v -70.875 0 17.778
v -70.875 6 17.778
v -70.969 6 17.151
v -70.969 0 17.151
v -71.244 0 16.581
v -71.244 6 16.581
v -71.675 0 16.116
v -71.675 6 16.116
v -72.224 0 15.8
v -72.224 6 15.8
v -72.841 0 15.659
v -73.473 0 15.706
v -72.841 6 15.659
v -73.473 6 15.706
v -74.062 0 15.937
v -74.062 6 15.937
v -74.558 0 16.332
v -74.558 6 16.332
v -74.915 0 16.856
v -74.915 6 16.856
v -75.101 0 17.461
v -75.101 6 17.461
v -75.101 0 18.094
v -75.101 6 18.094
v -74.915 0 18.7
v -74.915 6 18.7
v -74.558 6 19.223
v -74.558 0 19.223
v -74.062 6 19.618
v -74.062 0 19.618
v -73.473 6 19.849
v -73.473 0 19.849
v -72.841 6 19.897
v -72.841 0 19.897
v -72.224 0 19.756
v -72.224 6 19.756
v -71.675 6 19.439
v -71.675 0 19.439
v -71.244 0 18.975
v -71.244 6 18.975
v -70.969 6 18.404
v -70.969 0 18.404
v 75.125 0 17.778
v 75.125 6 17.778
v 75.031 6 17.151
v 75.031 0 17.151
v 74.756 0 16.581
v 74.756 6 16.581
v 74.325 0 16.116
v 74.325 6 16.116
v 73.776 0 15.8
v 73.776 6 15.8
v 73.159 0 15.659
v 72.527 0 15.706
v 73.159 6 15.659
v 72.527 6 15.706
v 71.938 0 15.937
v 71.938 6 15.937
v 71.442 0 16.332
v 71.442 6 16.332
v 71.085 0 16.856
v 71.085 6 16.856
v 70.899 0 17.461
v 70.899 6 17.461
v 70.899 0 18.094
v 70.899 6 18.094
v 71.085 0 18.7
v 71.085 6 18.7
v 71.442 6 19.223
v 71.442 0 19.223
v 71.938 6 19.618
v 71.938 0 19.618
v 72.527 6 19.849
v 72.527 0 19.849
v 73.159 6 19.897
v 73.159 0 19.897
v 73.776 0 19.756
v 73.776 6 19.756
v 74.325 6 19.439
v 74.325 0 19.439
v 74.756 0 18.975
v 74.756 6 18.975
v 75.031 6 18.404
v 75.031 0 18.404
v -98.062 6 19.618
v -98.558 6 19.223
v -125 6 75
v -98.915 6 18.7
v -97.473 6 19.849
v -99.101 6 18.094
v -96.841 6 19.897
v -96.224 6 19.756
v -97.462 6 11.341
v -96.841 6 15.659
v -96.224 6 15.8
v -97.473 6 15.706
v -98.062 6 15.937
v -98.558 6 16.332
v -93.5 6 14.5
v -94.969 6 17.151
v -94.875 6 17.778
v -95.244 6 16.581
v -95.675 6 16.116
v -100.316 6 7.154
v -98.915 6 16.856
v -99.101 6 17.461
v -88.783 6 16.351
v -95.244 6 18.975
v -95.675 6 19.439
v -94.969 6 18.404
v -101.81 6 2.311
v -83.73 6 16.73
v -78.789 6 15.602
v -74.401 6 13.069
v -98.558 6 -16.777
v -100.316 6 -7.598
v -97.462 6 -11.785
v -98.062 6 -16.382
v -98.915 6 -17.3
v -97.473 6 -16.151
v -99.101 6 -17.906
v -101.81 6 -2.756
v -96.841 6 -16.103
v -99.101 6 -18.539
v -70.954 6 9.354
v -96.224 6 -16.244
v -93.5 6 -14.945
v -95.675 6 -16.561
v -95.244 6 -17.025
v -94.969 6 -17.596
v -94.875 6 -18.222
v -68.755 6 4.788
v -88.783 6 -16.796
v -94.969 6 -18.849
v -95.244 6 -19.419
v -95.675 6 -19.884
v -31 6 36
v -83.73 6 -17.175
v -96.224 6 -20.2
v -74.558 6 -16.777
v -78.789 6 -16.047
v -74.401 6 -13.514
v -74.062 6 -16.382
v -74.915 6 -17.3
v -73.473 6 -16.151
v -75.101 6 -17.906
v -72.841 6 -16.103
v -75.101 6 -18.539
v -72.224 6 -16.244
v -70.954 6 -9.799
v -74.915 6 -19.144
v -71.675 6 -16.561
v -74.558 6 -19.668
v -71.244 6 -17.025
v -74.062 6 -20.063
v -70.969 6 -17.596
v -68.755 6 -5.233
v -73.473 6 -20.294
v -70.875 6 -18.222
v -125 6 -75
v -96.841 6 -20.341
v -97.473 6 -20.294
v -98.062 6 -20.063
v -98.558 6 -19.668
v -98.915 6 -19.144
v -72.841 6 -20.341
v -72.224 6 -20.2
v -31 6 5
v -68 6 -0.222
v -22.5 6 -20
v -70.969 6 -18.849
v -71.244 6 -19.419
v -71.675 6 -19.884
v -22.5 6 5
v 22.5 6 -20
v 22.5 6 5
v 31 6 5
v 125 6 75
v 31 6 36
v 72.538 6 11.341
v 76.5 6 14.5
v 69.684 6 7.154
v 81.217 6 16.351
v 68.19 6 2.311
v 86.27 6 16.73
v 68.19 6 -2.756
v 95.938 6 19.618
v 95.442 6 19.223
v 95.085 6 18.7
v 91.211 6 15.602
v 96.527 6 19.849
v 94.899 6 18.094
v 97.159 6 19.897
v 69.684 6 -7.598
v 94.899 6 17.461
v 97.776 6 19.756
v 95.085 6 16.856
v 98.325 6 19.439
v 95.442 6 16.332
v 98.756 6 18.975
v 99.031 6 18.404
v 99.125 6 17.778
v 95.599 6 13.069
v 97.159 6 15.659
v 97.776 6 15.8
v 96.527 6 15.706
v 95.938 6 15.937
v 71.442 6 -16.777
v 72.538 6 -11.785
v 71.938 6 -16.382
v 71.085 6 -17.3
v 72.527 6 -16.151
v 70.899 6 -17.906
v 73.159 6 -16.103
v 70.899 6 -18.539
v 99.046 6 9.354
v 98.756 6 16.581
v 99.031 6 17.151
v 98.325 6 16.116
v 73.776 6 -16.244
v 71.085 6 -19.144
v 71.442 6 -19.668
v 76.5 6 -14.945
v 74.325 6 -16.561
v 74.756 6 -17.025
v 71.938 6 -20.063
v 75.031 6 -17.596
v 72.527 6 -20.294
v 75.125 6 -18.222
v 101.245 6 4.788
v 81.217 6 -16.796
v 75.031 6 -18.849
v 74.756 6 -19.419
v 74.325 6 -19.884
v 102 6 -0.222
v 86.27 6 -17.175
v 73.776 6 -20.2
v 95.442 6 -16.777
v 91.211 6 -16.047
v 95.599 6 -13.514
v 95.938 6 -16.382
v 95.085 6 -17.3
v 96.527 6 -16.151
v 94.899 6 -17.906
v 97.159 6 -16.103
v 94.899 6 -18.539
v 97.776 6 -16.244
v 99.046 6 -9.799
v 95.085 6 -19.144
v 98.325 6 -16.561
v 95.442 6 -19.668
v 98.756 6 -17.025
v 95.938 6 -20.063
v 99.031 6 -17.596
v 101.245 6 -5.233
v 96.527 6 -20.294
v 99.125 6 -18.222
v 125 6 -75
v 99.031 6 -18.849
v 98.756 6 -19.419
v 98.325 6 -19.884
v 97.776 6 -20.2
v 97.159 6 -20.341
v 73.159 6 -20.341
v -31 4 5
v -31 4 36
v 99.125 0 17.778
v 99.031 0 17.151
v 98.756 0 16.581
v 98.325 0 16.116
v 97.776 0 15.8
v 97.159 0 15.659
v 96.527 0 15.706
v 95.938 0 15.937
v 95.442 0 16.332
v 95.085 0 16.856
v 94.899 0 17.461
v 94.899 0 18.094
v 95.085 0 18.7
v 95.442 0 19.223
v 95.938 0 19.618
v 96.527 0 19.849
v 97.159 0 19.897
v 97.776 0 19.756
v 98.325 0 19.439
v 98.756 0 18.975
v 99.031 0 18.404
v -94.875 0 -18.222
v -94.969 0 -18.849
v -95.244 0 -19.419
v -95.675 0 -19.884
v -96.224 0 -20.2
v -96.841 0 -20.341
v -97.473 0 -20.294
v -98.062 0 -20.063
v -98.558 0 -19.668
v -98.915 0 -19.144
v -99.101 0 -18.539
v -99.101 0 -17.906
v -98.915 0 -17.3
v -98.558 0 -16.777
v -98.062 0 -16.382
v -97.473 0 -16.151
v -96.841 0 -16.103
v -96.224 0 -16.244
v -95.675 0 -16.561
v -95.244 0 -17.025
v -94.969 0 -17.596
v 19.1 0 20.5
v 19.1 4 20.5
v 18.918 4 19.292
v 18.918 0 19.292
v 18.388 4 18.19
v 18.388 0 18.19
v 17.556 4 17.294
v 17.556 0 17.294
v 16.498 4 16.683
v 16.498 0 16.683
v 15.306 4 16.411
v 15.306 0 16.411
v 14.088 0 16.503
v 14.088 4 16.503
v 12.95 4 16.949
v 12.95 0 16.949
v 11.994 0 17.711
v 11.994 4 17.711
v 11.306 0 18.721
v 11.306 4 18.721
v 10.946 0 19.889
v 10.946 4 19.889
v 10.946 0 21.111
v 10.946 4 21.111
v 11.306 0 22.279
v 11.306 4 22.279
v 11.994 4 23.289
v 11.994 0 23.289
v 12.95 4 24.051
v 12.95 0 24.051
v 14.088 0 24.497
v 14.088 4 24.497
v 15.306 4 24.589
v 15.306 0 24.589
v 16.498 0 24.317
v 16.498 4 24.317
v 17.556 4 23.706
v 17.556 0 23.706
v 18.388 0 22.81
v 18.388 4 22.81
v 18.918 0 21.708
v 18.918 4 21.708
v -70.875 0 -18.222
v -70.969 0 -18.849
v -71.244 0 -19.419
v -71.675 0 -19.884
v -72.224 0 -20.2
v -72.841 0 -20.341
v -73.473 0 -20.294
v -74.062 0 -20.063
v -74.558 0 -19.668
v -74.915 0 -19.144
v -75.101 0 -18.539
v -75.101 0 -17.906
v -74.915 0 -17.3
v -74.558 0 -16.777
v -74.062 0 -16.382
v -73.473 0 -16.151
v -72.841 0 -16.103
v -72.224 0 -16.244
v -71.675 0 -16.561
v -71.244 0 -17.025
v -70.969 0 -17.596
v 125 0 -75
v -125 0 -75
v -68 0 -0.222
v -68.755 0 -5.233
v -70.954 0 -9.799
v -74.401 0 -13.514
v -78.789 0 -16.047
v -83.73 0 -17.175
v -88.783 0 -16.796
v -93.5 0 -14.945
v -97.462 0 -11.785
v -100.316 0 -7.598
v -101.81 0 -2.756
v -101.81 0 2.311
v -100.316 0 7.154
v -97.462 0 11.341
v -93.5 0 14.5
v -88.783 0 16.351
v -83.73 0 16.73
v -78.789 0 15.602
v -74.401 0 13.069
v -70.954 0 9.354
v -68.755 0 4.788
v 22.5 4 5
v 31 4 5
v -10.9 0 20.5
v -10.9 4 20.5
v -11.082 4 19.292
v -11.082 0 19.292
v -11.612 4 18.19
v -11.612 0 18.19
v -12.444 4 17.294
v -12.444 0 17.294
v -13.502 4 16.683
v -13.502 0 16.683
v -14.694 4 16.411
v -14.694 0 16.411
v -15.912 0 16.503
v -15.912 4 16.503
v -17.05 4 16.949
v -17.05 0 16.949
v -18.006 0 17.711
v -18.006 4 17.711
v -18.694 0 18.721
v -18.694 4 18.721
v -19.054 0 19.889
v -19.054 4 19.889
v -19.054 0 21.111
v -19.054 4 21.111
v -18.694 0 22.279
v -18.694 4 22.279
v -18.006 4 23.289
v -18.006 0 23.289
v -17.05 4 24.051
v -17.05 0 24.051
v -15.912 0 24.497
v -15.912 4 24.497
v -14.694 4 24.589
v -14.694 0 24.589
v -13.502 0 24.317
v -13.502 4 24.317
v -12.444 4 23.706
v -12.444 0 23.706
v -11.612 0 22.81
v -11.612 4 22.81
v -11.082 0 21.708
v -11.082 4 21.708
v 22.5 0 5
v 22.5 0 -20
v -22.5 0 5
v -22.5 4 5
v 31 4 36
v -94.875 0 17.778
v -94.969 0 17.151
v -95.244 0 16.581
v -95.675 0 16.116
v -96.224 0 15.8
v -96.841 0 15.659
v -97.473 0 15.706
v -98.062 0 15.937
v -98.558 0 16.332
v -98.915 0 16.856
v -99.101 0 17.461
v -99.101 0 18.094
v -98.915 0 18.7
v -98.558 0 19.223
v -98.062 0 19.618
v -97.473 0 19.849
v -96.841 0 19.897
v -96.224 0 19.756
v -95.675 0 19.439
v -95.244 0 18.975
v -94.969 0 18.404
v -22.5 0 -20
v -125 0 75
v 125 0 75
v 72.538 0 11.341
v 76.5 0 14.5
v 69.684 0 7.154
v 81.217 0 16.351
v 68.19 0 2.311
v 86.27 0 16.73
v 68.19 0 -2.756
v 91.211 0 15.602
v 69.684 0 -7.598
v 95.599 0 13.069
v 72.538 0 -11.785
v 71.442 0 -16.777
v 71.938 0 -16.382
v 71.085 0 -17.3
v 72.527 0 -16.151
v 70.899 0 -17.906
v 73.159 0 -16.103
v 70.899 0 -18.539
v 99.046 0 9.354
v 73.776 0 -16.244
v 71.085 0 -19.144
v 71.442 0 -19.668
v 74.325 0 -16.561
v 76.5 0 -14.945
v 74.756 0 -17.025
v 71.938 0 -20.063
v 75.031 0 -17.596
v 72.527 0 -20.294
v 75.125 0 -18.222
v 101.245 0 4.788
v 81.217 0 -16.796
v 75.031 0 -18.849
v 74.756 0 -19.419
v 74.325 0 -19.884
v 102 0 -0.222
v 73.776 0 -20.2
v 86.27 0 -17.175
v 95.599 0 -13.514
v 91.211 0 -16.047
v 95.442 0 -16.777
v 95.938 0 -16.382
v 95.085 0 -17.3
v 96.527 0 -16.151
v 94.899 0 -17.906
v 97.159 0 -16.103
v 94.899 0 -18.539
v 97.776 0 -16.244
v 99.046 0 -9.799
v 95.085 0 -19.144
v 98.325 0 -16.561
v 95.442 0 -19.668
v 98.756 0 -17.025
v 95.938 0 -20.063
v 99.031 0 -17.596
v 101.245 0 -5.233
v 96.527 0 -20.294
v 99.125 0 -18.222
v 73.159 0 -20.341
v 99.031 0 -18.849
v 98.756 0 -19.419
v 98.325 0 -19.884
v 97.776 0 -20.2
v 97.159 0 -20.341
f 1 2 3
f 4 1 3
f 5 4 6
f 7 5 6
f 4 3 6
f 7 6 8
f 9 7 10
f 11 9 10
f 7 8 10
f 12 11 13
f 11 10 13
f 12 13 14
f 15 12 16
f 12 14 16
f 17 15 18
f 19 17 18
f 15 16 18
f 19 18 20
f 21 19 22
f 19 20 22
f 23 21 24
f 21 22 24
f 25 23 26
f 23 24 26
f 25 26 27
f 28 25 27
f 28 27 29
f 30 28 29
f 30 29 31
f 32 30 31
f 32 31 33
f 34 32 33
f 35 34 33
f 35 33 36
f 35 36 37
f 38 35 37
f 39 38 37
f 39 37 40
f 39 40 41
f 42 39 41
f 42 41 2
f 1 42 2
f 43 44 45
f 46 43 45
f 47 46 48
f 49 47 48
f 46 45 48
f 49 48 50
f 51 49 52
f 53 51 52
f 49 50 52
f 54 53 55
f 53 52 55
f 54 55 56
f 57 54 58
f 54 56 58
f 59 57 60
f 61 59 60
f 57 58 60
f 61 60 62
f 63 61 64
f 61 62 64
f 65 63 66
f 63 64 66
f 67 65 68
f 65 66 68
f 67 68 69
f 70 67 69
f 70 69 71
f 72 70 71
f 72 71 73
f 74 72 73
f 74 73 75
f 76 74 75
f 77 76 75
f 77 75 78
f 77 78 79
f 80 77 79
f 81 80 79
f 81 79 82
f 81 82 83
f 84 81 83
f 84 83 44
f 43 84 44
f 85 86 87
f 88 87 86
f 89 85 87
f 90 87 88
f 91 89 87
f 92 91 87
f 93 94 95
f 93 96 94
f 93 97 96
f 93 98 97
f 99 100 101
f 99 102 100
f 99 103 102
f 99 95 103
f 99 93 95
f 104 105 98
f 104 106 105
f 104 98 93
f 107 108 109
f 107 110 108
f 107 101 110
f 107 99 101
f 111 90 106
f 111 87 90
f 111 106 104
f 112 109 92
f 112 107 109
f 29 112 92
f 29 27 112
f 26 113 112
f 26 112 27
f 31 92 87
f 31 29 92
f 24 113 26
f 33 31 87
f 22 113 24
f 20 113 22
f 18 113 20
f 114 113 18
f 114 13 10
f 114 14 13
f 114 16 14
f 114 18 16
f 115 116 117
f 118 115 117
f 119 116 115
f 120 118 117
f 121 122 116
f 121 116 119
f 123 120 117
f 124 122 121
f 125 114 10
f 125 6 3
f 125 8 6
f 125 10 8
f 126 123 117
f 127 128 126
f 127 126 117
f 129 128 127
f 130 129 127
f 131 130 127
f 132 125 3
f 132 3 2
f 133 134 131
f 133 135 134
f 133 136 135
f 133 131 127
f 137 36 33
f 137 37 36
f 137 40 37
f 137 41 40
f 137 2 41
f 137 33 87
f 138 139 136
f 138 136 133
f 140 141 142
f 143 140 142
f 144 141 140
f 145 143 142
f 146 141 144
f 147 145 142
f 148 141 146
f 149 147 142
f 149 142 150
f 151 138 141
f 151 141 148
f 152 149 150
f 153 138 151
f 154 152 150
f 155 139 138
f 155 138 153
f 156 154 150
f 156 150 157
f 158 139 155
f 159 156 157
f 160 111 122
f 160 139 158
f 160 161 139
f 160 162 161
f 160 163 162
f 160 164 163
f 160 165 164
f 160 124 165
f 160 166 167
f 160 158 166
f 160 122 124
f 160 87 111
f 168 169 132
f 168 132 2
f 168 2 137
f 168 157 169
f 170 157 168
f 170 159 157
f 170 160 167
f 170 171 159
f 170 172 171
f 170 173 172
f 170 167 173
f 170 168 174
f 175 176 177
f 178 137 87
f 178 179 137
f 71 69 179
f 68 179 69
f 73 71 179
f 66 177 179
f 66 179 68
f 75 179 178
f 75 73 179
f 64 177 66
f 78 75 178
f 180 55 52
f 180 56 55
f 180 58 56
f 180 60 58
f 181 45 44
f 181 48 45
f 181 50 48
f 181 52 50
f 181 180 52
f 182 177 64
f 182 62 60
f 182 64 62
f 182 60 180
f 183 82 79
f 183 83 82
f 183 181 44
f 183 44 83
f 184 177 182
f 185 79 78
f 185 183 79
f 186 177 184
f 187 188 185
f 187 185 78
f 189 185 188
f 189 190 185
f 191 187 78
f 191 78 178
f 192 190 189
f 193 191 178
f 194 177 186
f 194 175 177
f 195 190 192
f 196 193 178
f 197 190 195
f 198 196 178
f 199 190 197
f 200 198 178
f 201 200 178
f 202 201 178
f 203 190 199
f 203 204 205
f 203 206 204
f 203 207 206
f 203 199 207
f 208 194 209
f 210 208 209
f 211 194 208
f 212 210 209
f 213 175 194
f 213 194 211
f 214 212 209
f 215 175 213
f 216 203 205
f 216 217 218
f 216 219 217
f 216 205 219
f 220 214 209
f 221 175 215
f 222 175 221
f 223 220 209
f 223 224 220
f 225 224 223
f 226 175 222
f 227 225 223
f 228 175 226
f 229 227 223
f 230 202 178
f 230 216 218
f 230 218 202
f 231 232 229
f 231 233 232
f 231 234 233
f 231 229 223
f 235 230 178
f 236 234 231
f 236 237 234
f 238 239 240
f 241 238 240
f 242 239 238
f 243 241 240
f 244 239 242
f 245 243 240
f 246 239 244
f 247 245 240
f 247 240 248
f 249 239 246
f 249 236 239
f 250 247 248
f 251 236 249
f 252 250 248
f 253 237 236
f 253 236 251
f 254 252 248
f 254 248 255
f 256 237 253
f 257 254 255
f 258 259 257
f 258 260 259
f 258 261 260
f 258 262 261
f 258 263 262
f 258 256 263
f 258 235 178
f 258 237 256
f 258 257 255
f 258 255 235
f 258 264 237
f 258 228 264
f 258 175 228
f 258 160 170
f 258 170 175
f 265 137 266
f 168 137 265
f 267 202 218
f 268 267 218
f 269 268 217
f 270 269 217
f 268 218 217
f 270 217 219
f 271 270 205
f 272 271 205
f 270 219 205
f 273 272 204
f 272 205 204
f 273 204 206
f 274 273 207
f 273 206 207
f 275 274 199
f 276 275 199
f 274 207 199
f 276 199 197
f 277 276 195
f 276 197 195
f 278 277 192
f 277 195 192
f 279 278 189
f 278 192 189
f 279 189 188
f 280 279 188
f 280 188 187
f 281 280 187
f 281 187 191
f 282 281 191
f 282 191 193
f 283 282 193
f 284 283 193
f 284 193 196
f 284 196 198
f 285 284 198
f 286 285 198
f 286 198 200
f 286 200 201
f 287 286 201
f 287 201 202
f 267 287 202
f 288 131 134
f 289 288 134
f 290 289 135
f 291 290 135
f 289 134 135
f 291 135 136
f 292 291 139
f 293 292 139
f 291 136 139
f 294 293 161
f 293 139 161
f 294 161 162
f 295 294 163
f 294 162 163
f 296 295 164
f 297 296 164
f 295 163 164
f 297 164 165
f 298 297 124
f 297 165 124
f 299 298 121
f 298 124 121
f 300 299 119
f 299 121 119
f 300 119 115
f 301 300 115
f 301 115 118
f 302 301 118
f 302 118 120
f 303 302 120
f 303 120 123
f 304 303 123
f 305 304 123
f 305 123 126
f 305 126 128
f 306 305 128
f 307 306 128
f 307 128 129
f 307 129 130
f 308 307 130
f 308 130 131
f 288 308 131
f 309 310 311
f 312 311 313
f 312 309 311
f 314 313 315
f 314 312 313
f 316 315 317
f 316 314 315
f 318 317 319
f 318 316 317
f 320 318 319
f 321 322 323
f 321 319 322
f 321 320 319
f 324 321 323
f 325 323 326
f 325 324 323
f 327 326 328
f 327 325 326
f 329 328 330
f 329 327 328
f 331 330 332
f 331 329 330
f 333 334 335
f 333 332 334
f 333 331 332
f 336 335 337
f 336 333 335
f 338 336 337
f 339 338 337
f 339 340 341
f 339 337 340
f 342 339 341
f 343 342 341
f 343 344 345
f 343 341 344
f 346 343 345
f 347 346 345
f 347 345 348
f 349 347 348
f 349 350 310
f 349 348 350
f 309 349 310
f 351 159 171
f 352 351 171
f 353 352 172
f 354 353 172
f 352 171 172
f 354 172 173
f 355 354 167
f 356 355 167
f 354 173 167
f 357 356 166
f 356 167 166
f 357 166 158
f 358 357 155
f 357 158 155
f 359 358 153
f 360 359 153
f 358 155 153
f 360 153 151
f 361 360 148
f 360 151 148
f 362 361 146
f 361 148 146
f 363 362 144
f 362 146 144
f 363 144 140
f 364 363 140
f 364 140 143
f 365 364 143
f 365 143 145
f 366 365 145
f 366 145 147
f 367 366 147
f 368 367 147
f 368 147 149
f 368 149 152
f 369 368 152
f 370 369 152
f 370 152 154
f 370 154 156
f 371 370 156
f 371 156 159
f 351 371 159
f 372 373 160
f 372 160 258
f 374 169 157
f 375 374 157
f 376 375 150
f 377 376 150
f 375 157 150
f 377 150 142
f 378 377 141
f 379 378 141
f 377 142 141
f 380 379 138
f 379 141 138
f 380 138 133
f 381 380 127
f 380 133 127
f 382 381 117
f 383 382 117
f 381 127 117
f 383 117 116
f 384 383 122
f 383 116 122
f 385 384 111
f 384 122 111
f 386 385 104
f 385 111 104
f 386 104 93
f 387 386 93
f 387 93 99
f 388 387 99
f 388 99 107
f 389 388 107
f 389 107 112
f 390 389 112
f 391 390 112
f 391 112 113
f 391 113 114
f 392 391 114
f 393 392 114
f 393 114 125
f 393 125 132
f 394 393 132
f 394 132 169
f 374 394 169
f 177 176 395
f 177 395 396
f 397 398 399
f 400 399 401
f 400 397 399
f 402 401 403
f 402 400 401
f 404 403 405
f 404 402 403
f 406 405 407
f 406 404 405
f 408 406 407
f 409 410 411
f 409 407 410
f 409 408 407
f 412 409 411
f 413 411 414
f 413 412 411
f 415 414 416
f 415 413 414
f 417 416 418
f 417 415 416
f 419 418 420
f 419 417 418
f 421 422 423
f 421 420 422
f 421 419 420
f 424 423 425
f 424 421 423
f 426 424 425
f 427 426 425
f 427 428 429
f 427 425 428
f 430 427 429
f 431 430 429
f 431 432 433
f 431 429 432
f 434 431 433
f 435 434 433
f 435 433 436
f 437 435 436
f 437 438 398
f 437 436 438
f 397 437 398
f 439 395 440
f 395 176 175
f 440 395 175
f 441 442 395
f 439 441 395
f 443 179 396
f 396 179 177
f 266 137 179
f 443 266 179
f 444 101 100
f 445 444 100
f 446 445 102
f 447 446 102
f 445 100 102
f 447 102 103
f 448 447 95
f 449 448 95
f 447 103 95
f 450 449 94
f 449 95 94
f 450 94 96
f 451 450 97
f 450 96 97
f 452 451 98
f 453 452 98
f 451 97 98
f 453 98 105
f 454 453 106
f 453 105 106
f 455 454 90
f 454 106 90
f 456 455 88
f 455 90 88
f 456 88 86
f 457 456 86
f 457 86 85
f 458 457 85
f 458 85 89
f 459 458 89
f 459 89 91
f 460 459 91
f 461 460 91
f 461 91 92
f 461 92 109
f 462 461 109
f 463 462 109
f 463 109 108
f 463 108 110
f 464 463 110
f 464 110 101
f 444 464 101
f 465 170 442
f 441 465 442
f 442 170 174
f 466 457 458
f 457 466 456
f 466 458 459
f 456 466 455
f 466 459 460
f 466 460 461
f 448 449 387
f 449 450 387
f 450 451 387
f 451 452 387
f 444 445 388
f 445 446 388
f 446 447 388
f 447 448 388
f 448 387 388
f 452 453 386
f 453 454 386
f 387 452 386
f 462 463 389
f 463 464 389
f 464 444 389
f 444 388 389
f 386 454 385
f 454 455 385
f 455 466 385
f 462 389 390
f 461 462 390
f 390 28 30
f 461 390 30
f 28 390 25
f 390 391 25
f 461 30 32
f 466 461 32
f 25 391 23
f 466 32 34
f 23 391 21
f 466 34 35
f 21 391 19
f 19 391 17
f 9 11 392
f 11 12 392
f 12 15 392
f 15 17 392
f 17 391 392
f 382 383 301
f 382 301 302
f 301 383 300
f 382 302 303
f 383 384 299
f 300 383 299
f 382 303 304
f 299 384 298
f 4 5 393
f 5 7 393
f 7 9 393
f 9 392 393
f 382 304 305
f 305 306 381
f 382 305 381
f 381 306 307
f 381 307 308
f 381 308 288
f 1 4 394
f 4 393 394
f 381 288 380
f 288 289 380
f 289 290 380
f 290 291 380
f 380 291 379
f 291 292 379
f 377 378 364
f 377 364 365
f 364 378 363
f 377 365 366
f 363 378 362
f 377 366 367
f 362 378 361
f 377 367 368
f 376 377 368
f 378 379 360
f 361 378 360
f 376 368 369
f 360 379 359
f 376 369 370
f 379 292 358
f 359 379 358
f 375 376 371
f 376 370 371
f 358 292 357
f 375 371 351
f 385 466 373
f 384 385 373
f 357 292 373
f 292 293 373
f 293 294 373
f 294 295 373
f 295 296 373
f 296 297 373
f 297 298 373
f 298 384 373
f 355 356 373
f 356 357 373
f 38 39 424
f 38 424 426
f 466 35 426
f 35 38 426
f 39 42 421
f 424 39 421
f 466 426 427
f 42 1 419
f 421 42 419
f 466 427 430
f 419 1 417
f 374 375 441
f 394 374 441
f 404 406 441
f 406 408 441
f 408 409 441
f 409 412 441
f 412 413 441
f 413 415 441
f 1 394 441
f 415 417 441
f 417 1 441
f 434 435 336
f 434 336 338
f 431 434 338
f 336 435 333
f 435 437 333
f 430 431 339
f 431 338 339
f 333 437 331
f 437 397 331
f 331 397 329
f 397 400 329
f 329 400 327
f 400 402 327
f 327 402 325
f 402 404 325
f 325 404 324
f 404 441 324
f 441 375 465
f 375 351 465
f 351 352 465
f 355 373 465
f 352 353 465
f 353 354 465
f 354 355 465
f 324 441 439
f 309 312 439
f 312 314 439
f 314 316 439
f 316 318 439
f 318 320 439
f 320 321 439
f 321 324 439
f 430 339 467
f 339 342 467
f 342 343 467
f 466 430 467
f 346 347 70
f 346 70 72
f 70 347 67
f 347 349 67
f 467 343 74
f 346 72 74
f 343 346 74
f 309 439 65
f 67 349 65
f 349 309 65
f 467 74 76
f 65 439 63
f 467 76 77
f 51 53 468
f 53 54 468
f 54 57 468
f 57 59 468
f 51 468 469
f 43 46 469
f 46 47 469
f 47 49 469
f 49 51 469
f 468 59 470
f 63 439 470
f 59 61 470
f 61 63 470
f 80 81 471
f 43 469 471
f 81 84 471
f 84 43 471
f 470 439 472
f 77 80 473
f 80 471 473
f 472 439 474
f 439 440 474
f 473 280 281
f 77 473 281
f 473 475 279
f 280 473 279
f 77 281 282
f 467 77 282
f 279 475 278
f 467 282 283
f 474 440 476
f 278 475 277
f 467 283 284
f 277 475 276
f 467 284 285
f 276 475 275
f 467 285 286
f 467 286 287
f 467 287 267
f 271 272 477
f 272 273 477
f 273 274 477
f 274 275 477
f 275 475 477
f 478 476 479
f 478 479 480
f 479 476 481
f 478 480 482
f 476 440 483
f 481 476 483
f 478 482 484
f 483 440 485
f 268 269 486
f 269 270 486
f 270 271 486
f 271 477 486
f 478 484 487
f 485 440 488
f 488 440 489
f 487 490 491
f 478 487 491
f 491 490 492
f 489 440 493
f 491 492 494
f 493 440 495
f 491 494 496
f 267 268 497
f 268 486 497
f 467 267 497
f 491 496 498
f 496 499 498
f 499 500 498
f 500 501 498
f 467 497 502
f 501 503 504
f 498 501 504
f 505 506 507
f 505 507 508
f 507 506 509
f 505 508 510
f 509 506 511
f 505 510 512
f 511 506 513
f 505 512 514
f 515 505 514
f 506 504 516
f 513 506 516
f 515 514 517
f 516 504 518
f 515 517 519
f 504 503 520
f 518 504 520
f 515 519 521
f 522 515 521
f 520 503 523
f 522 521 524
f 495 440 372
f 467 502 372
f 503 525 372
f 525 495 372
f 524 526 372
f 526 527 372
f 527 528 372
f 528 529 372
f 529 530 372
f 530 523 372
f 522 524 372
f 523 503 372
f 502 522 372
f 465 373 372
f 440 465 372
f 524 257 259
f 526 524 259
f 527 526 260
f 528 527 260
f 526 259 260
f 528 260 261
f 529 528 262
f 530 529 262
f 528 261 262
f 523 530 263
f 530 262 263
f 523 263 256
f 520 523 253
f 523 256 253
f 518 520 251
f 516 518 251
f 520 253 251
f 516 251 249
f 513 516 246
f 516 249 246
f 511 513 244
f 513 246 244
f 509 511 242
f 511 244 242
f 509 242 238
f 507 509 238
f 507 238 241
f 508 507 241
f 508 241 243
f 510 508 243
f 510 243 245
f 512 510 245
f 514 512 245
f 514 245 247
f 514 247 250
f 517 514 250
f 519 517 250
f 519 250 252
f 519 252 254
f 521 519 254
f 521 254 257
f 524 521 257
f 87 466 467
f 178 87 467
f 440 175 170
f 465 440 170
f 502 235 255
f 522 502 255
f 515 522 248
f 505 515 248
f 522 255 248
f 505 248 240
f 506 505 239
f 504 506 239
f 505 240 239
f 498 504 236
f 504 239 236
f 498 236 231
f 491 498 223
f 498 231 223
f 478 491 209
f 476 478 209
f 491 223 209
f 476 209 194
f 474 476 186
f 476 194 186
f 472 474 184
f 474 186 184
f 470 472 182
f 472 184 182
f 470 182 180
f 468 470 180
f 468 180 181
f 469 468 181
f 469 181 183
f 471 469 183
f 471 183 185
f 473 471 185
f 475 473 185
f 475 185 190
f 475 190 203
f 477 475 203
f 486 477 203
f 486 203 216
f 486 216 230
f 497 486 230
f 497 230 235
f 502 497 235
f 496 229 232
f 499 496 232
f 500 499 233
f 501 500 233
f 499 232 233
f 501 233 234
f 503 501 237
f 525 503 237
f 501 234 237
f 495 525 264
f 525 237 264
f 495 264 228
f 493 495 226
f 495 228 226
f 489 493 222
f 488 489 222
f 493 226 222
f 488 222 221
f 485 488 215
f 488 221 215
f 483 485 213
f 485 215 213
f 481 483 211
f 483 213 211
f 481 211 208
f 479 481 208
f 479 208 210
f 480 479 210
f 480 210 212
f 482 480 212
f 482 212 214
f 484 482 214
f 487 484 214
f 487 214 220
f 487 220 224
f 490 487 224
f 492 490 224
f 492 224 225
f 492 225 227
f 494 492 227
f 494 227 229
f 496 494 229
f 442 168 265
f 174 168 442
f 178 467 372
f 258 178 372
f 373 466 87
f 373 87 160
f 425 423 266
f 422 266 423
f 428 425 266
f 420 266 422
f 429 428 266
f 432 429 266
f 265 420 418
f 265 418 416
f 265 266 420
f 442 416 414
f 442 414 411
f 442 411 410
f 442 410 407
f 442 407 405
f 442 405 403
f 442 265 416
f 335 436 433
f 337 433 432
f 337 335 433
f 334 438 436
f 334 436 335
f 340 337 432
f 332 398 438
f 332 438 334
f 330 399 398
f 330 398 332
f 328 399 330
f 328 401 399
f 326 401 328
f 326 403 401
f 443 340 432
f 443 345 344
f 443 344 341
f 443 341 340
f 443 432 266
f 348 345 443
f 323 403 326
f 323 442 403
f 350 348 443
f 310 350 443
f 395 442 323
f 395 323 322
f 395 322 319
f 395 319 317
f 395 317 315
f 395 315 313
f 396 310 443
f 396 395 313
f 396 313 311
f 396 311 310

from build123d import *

# Parameters (mm, degrees)
SKETCH1_W           = 250
SKETCH1_H           = 150
SKETCH1_R           = 4.1
BOSS_EXTRUDE1_DEPTH = 6
SKETCH2_W           = 62
SKETCH2_H           = 31
CUT_EXTRUDE1_DEPTH  = 2
SKETCH3_R           = 17
SKETCH3_R_2         = 2.125
CUT_EXTRUDE3_DEPTH  = 29


with BuildPart() as part:
    # Sketch1 → Boss-Extrude1 (new body)
    with BuildSketch(Plane(origin=(0, 0, 0), x_dir=(1, 0, 0), z_dir=(0, 1, 0))):
        Rectangle(SKETCH1_W, SKETCH1_H)
        with Locations((15, -20.5)):
            Circle(SKETCH1_R, mode=Mode.SUBTRACT)
        with Locations((-15, -20.5)):
            Circle(SKETCH1_R, mode=Mode.SUBTRACT)
    extrude(amount=BOSS_EXTRUDE1_DEPTH)

    # Sketch2 → Cut-Extrude1 (cut)
    with BuildSketch(Plane(origin=(0, 6, 0), x_dir=(1, 0, 0), z_dir=(0, 1, 0))):
        with Locations((0, -20.5)):
            Rectangle(SKETCH2_W, SKETCH2_H)
    extrude(amount=-CUT_EXTRUDE1_DEPTH, mode=Mode.SUBTRACT)

    # Sketch3 → Cut-Extrude3 (cut)
    with BuildSketch(Plane(origin=(0, 6, 0), x_dir=(1, 0, 0), z_dir=(0, 1, 0))):
        Polygon((22.5, 20), (-22.5, 20), (-22.5, -5), (0, -5), (22.5, -5), align=None)
        with Locations((-85, 0.222388038)):
            Circle(SKETCH3_R)
        with Locations((85, 0.222388038)):
            Circle(SKETCH3_R)
        with Locations((-97, 18.222388038)):
            Circle(SKETCH3_R_2)
        with Locations((-97, -17.777611962)):
            Circle(SKETCH3_R_2)
        with Locations((-73, -17.777611962)):
            Circle(SKETCH3_R_2)
        with Locations((-73, 18.222388038)):
            Circle(SKETCH3_R_2)
        with Locations((73, -17.777611962)):
            Circle(SKETCH3_R_2)
        with Locations((97, -17.777611962)):
            Circle(SKETCH3_R_2)
        with Locations((97, 18.222388038)):
            Circle(SKETCH3_R_2)
        with Locations((73, 18.222388038)):
            Circle(SKETCH3_R_2)
    extrude(amount=-CUT_EXTRUDE3_DEPTH, mode=Mode.SUBTRACT)


solid = part.part
